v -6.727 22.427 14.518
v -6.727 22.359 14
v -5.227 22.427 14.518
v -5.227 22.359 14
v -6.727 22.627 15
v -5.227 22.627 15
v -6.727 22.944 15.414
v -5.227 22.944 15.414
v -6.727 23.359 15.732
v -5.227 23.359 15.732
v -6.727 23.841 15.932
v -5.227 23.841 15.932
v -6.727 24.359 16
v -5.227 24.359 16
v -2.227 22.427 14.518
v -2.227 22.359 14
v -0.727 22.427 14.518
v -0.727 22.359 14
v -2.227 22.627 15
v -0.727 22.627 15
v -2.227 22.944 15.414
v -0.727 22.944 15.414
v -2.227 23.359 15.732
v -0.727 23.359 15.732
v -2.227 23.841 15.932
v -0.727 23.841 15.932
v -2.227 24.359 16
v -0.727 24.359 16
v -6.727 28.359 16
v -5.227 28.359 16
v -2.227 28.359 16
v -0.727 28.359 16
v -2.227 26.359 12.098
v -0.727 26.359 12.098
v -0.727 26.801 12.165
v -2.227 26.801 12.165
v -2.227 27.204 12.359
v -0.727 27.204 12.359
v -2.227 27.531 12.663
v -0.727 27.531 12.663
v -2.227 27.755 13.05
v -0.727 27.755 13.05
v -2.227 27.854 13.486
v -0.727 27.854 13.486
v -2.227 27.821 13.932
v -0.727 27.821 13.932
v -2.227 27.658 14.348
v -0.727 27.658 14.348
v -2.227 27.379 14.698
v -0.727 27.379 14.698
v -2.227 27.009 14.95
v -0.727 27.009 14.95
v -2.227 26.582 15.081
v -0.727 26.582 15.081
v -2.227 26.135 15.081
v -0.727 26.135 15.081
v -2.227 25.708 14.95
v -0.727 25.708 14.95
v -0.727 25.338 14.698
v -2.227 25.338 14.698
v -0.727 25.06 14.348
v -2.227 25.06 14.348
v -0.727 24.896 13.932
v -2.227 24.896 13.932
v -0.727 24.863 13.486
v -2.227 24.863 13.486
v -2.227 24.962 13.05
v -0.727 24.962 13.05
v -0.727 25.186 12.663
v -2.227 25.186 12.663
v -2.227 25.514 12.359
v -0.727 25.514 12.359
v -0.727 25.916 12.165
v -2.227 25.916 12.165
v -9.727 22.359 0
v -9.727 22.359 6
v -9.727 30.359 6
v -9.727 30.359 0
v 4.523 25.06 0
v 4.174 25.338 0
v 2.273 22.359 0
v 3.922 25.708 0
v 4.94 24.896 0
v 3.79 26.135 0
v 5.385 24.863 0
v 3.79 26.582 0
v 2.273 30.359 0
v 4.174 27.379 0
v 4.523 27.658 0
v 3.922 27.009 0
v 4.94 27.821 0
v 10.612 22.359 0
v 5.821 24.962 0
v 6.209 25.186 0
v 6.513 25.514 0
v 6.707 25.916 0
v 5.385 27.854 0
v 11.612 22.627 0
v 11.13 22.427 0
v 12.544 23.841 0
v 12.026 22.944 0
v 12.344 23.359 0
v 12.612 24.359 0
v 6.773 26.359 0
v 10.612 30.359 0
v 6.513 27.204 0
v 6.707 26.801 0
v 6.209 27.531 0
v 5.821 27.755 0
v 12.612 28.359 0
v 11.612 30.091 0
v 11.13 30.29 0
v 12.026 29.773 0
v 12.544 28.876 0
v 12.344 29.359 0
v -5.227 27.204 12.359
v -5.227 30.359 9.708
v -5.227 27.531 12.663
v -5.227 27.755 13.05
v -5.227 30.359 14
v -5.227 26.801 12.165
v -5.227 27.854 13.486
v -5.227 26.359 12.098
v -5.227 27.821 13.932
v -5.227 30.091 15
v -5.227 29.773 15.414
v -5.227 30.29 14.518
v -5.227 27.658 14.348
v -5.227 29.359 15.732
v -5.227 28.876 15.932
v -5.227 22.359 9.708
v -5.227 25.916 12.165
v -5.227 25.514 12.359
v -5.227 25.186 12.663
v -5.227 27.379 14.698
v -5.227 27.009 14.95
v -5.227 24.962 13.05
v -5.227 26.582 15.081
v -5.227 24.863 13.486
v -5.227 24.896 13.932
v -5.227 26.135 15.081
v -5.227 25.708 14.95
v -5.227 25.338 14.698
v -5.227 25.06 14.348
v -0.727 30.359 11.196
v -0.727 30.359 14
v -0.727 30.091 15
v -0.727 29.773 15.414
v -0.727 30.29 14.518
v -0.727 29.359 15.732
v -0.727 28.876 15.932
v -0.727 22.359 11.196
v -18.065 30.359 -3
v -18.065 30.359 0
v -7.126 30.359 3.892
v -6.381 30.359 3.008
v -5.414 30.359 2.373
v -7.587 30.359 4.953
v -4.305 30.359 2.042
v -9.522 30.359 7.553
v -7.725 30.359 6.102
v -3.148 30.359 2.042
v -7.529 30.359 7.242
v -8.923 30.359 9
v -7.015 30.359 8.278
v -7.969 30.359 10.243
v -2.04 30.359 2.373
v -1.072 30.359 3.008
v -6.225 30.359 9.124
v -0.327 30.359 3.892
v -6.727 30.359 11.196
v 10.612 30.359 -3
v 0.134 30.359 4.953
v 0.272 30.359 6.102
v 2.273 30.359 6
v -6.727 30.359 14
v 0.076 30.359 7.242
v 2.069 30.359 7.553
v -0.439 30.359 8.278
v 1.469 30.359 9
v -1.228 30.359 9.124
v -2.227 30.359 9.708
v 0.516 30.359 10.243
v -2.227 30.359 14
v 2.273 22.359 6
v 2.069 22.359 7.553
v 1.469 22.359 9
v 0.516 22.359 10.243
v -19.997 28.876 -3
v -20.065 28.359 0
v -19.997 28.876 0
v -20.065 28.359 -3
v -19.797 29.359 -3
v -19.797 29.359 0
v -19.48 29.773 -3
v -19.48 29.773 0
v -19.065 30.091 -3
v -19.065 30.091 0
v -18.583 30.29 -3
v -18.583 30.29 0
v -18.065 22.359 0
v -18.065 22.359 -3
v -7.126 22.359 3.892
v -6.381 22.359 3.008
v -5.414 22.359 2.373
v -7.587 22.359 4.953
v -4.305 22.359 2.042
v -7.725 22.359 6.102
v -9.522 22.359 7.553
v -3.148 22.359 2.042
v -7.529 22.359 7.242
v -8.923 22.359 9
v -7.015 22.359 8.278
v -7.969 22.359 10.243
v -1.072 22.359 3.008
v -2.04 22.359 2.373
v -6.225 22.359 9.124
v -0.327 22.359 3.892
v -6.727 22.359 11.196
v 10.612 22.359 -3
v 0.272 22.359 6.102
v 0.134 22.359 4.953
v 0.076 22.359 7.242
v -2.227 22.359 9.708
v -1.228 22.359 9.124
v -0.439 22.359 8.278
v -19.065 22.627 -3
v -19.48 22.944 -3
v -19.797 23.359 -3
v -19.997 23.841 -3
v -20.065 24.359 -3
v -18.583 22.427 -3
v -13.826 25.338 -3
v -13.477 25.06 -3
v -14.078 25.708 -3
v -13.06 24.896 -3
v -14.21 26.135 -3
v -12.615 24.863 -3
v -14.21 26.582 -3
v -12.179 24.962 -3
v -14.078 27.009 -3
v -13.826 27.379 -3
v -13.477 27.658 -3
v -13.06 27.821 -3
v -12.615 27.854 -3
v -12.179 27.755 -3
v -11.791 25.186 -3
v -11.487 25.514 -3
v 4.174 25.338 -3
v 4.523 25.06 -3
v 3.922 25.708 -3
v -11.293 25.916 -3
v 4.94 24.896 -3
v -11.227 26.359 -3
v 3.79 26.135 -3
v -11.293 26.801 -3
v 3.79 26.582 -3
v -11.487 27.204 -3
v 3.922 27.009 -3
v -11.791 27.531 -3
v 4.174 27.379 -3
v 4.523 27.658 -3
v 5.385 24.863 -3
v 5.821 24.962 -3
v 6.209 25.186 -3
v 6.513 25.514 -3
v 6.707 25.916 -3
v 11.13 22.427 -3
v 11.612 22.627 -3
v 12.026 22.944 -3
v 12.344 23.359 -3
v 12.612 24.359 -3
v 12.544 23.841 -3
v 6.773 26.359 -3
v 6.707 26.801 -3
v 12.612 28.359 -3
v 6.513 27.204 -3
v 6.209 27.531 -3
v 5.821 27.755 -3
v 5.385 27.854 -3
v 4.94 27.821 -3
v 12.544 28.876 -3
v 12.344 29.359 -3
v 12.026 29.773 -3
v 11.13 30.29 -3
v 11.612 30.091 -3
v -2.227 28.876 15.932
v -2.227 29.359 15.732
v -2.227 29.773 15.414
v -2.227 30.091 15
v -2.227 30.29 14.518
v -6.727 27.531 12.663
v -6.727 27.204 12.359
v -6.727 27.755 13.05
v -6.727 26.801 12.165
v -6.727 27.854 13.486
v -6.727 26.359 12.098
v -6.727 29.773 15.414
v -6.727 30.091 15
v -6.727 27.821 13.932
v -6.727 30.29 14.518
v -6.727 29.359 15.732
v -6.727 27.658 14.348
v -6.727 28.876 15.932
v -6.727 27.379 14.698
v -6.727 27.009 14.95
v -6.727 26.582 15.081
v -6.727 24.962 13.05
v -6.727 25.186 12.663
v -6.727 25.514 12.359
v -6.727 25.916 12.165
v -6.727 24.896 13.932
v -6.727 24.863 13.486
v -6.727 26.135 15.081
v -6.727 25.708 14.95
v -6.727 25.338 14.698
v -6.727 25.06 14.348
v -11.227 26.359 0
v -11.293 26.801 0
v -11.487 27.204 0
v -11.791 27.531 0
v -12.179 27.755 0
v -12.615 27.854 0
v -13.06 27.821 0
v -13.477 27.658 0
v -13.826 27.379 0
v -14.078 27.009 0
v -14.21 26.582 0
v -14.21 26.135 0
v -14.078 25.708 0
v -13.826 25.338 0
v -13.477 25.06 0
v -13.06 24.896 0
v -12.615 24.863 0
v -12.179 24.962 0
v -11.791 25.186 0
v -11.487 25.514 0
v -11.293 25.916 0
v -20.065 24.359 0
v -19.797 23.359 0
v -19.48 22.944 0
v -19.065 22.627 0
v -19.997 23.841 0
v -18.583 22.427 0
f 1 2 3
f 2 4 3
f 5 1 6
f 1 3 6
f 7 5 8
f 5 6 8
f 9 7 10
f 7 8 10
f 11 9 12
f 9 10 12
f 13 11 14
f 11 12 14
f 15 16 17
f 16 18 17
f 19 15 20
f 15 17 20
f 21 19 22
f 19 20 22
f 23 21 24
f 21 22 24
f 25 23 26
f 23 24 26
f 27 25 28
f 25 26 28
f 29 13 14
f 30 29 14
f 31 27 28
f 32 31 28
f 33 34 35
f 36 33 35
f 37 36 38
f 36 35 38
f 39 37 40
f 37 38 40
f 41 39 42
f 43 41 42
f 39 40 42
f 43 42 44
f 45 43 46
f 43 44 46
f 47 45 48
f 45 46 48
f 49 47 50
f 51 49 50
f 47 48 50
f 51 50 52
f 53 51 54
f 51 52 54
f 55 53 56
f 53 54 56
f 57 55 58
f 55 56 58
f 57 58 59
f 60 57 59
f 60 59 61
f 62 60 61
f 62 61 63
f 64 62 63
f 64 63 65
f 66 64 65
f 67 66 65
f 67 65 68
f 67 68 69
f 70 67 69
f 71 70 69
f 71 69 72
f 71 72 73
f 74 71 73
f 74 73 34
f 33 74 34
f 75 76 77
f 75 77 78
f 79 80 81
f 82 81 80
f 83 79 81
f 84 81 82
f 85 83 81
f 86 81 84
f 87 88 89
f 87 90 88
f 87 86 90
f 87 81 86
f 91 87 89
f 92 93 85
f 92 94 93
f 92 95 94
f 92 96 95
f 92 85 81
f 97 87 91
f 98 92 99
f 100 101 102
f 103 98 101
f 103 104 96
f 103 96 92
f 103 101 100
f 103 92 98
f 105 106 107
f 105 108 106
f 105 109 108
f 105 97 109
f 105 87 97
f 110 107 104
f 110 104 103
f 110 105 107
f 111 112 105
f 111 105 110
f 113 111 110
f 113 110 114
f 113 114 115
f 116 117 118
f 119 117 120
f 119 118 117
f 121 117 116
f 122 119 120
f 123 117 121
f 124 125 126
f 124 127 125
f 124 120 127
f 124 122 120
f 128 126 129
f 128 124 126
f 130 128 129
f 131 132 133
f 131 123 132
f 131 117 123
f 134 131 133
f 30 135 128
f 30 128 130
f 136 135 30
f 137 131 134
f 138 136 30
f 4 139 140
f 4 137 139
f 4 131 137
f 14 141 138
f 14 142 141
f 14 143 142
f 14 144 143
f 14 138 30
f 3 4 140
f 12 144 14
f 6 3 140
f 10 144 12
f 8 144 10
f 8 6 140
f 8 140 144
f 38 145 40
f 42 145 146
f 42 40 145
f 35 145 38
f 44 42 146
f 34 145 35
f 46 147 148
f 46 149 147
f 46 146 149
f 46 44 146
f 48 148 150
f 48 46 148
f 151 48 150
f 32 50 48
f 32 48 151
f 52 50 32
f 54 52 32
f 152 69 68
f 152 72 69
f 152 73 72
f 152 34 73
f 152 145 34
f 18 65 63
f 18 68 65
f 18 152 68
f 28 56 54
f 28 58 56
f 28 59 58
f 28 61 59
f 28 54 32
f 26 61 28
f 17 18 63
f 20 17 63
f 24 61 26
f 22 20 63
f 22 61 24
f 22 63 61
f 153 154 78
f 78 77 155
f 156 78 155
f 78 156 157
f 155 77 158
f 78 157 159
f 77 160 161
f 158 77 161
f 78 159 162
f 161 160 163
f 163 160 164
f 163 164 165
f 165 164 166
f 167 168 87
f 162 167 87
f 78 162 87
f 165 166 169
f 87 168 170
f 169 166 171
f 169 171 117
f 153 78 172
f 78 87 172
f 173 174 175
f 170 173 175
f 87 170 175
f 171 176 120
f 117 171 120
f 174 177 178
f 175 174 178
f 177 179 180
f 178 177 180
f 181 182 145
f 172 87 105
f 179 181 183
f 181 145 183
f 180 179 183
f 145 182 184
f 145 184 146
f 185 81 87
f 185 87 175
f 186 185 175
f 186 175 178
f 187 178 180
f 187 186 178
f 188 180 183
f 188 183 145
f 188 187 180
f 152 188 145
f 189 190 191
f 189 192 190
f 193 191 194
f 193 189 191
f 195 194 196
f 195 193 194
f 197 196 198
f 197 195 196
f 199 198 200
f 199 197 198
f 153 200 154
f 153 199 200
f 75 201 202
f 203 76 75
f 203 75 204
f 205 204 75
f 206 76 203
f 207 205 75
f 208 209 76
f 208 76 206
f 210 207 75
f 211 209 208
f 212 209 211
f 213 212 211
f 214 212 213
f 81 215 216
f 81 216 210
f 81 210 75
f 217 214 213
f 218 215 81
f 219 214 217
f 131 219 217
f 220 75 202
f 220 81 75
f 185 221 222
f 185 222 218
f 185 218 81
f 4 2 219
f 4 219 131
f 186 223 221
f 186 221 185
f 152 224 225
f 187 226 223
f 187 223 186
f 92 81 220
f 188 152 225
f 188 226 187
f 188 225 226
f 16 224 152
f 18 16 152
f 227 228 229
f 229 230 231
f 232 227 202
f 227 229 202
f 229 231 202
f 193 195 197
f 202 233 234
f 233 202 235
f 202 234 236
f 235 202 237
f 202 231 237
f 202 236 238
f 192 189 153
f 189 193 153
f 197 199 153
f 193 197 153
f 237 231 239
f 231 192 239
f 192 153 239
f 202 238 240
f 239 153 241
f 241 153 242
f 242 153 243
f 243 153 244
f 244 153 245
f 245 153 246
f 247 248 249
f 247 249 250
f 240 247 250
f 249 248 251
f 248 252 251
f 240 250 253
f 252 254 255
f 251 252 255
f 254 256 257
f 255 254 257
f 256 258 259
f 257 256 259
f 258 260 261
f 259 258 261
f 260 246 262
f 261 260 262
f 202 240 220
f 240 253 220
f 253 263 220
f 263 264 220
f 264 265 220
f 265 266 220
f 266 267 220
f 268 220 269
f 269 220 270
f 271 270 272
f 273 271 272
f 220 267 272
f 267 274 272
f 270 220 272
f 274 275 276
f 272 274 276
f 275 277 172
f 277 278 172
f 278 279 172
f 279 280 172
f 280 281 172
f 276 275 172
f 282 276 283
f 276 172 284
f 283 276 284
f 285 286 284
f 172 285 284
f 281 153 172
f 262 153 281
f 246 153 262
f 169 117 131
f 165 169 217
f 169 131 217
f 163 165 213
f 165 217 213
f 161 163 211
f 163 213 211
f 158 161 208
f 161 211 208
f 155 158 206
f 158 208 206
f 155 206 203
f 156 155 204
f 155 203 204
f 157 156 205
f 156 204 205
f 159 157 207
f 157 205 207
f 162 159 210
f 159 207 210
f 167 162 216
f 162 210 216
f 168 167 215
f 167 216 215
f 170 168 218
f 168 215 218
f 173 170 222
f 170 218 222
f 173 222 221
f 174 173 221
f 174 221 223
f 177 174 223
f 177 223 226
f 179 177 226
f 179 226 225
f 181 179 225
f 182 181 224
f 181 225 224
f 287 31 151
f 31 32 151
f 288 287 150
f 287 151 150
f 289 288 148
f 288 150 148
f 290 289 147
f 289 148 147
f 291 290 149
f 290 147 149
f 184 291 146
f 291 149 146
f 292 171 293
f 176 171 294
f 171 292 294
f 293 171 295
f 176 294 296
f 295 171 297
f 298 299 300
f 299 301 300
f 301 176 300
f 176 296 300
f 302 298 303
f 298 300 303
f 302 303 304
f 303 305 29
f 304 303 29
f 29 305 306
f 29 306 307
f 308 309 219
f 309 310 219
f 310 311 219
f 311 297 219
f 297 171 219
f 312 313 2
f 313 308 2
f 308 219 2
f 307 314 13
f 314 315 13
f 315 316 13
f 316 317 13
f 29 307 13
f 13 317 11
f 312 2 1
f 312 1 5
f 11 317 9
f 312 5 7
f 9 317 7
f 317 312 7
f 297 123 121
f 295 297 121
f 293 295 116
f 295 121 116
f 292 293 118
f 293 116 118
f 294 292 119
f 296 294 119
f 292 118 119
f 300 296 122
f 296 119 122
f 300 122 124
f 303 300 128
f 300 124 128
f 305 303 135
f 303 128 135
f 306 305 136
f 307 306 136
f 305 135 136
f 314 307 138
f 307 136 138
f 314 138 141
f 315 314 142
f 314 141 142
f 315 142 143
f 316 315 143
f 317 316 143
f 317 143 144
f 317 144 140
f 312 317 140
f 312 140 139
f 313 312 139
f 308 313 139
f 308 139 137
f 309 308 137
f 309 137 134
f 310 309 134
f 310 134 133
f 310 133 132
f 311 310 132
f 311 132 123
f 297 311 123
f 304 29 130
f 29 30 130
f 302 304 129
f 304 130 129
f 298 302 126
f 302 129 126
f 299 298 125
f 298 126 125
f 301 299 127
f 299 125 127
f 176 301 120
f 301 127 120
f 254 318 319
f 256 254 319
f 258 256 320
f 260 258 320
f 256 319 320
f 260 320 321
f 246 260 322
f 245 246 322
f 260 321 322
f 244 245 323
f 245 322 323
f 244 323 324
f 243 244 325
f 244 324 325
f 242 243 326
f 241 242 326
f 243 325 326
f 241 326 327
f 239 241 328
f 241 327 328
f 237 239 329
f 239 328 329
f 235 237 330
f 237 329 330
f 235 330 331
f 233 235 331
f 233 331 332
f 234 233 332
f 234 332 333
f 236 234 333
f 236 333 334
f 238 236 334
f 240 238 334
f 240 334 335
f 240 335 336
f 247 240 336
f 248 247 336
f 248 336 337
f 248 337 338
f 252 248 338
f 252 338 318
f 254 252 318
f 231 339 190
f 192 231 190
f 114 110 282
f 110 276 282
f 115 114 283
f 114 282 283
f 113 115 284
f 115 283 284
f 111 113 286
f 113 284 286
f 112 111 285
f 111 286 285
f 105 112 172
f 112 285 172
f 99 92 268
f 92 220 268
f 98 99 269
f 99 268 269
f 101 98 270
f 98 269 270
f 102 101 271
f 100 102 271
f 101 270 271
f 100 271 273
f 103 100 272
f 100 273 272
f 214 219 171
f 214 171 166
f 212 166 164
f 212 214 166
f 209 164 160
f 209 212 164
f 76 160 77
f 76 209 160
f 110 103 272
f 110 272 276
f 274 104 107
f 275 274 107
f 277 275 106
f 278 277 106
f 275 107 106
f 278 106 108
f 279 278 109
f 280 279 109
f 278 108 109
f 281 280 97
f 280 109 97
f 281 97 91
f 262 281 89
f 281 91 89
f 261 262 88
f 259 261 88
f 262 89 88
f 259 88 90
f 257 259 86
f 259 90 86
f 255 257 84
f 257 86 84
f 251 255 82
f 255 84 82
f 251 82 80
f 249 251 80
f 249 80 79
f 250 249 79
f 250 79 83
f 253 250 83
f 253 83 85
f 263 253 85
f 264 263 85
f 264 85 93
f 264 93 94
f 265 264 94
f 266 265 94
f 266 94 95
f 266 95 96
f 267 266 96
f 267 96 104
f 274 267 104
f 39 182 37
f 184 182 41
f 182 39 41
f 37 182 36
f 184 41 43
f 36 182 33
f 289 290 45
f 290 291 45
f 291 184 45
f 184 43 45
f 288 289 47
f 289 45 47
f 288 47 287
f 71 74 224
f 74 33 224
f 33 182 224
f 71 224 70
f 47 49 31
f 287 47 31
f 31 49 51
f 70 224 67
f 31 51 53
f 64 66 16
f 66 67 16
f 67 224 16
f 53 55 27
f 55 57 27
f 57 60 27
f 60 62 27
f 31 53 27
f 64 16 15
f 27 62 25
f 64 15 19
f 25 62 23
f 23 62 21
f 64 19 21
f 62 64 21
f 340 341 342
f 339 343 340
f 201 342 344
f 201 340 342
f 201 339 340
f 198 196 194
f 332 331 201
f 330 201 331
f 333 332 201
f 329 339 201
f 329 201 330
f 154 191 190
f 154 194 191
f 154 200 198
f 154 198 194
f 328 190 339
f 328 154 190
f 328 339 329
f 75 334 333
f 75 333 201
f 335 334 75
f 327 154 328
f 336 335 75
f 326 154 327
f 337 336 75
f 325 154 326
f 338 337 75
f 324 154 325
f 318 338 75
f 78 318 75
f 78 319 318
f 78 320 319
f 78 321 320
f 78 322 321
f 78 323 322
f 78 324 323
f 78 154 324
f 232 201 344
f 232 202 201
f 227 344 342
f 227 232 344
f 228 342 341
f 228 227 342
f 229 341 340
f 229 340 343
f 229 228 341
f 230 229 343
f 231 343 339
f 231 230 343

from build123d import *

# Parameters (mm, degrees)
SKETCH_1_W          = 32.677388302
SKETCH_1_H          = 8
EXTRUDE_1_DEPTH     = 3
SKETCH_2_R          = 1.5
CUT_EXTRUDE_1_DEPTH = 4
SKETCH_3_R          = 6
EXTRUDE_2_DEPTH     = 8
SKETCH_4_R          = 4
CUT_EXTRUDE_2_DEPTH = 9
EXTRUDE_3_DEPTH     = 8
SKETCH_6_W          = 6
SKETCH_6_H          = 6
EXTRUDE_4_DEPTH     = 8
SKETCH_8_W          = 3
SKETCH_8_H          = 10.466633743
CUT_EXTRUDE_5_DEPTH = 9
SKETCH_9_R          = 1.5
CUT_EXTRUDE_6_DEPTH = 20.338694151
FILLET_1_R          = 2
FILLET_2_R          = 2


with BuildPart() as part:
    # 草图1 → 凸台-拉伸1 (new body)
    with BuildSketch(Plane.XY):
        with Locations((-3.726697353, 26.358574689)):
            Rectangle(SKETCH_1_W, SKETCH_1_H)
    extrude(amount=-EXTRUDE_1_DEPTH)

    # 草图2 → 切除-拉伸1 (cut, through all)
    with BuildSketch(Plane.XY):
        with Locations((-12.726697353, 26.358574689)):
            Circle(SKETCH_2_R)
        with Locations((5.273302647, 26.358574689)):
            Circle(SKETCH_2_R)
    extrude(amount=-CUT_EXTRUDE_1_DEPTH, mode=Mode.SUBTRACT)



with BuildPart() as body_2:
    # 草图3 → 凸台-拉伸2 (new body)
    with BuildSketch(Plane.XZ.offset(-22.358574689)):
        with Locations((-3.726697353, 6)):
            Circle(SKETCH_3_R)
    extrude(amount=-EXTRUDE_2_DEPTH)

    # 草图4 → 切除-拉伸2 (cut, through all)
    with BuildSketch(Plane.XZ.offset(-22.358574689)):
        with Locations((-3.726697353, 6)):
            Circle(SKETCH_4_R)
    extrude(amount=-CUT_EXTRUDE_2_DEPTH, mode=Mode.SUBTRACT)


with BuildPart() as part_1:
    add(part.part)

    add(body_2.part)  # 凸台-拉伸3 merges body 2
    # 草图5 → 凸台-拉伸3 (add)
    with BuildSketch(Plane.XZ.offset(-22.358574689)):
        Polygon((-3.726697353, 0), (-9.726697353, 6), (-9.726697353, 0), align=None)
        Polygon((2.273302647, 6), (-3.726697353, 0), (2.273302647, 0), align=None)
    extrude(amount=-EXTRUDE_3_DEPTH)

    # 草图6 → 凸台-拉伸4 (add)
    with BuildSketch(Plane.XZ.offset(-22.358574689)):
        with Locations((-3.726697353, 13)):
            Rectangle(SKETCH_6_W, SKETCH_6_H)
    extrude(amount=-EXTRUDE_4_DEPTH)

    # 草图8 → 切除-拉伸5 (cut, through all)
    with BuildSketch(Plane.XZ.offset(-22.358574689)):
        with Locations((-3.726697353, 11.233316872)):
            Rectangle(SKETCH_8_W, SKETCH_8_H)
    extrude(amount=-CUT_EXTRUDE_5_DEPTH, mode=Mode.SUBTRACT)

    # 草图9 → 切除-拉伸6 (cut, through all)
    with BuildSketch(Plane(origin=(-0.726697353, 0, 0), x_dir=(0, 0, -1), z_dir=(1, 0, 0))):
        with Locations((-13.598076211, 26.358574689)):
            Circle(SKETCH_9_R)
    extrude(amount=-CUT_EXTRUDE_6_DEPTH, mode=Mode.SUBTRACT)

    # 圆角1
    fillet_1_edges = [part_1.edges().sort_by_distance(p)[0] for p in [
        (12.611996798, 22.358574689, -1.5),
        (-20.065391504, 22.358574689, -1.5),
        (-20.065391504, 30.358574689, -1.5),
        (12.611996798, 30.358574689, -1.5),
    ]]
    fillet(fillet_1_edges, radius=FILLET_1_R)

    # 圆角2
    fillet_2_edges = [part_1.edges().sort_by_distance(p)[0] for p in [
        (-1.476697353, 22.358574689, 16),
        (-1.476697353, 30.358574689, 16),
        (-5.976697353, 30.358574689, 16),
        (-5.976697353, 22.358574689, 16),
    ]]
    fillet(fillet_2_edges, radius=FILLET_2_R)


solid = part_1.part
